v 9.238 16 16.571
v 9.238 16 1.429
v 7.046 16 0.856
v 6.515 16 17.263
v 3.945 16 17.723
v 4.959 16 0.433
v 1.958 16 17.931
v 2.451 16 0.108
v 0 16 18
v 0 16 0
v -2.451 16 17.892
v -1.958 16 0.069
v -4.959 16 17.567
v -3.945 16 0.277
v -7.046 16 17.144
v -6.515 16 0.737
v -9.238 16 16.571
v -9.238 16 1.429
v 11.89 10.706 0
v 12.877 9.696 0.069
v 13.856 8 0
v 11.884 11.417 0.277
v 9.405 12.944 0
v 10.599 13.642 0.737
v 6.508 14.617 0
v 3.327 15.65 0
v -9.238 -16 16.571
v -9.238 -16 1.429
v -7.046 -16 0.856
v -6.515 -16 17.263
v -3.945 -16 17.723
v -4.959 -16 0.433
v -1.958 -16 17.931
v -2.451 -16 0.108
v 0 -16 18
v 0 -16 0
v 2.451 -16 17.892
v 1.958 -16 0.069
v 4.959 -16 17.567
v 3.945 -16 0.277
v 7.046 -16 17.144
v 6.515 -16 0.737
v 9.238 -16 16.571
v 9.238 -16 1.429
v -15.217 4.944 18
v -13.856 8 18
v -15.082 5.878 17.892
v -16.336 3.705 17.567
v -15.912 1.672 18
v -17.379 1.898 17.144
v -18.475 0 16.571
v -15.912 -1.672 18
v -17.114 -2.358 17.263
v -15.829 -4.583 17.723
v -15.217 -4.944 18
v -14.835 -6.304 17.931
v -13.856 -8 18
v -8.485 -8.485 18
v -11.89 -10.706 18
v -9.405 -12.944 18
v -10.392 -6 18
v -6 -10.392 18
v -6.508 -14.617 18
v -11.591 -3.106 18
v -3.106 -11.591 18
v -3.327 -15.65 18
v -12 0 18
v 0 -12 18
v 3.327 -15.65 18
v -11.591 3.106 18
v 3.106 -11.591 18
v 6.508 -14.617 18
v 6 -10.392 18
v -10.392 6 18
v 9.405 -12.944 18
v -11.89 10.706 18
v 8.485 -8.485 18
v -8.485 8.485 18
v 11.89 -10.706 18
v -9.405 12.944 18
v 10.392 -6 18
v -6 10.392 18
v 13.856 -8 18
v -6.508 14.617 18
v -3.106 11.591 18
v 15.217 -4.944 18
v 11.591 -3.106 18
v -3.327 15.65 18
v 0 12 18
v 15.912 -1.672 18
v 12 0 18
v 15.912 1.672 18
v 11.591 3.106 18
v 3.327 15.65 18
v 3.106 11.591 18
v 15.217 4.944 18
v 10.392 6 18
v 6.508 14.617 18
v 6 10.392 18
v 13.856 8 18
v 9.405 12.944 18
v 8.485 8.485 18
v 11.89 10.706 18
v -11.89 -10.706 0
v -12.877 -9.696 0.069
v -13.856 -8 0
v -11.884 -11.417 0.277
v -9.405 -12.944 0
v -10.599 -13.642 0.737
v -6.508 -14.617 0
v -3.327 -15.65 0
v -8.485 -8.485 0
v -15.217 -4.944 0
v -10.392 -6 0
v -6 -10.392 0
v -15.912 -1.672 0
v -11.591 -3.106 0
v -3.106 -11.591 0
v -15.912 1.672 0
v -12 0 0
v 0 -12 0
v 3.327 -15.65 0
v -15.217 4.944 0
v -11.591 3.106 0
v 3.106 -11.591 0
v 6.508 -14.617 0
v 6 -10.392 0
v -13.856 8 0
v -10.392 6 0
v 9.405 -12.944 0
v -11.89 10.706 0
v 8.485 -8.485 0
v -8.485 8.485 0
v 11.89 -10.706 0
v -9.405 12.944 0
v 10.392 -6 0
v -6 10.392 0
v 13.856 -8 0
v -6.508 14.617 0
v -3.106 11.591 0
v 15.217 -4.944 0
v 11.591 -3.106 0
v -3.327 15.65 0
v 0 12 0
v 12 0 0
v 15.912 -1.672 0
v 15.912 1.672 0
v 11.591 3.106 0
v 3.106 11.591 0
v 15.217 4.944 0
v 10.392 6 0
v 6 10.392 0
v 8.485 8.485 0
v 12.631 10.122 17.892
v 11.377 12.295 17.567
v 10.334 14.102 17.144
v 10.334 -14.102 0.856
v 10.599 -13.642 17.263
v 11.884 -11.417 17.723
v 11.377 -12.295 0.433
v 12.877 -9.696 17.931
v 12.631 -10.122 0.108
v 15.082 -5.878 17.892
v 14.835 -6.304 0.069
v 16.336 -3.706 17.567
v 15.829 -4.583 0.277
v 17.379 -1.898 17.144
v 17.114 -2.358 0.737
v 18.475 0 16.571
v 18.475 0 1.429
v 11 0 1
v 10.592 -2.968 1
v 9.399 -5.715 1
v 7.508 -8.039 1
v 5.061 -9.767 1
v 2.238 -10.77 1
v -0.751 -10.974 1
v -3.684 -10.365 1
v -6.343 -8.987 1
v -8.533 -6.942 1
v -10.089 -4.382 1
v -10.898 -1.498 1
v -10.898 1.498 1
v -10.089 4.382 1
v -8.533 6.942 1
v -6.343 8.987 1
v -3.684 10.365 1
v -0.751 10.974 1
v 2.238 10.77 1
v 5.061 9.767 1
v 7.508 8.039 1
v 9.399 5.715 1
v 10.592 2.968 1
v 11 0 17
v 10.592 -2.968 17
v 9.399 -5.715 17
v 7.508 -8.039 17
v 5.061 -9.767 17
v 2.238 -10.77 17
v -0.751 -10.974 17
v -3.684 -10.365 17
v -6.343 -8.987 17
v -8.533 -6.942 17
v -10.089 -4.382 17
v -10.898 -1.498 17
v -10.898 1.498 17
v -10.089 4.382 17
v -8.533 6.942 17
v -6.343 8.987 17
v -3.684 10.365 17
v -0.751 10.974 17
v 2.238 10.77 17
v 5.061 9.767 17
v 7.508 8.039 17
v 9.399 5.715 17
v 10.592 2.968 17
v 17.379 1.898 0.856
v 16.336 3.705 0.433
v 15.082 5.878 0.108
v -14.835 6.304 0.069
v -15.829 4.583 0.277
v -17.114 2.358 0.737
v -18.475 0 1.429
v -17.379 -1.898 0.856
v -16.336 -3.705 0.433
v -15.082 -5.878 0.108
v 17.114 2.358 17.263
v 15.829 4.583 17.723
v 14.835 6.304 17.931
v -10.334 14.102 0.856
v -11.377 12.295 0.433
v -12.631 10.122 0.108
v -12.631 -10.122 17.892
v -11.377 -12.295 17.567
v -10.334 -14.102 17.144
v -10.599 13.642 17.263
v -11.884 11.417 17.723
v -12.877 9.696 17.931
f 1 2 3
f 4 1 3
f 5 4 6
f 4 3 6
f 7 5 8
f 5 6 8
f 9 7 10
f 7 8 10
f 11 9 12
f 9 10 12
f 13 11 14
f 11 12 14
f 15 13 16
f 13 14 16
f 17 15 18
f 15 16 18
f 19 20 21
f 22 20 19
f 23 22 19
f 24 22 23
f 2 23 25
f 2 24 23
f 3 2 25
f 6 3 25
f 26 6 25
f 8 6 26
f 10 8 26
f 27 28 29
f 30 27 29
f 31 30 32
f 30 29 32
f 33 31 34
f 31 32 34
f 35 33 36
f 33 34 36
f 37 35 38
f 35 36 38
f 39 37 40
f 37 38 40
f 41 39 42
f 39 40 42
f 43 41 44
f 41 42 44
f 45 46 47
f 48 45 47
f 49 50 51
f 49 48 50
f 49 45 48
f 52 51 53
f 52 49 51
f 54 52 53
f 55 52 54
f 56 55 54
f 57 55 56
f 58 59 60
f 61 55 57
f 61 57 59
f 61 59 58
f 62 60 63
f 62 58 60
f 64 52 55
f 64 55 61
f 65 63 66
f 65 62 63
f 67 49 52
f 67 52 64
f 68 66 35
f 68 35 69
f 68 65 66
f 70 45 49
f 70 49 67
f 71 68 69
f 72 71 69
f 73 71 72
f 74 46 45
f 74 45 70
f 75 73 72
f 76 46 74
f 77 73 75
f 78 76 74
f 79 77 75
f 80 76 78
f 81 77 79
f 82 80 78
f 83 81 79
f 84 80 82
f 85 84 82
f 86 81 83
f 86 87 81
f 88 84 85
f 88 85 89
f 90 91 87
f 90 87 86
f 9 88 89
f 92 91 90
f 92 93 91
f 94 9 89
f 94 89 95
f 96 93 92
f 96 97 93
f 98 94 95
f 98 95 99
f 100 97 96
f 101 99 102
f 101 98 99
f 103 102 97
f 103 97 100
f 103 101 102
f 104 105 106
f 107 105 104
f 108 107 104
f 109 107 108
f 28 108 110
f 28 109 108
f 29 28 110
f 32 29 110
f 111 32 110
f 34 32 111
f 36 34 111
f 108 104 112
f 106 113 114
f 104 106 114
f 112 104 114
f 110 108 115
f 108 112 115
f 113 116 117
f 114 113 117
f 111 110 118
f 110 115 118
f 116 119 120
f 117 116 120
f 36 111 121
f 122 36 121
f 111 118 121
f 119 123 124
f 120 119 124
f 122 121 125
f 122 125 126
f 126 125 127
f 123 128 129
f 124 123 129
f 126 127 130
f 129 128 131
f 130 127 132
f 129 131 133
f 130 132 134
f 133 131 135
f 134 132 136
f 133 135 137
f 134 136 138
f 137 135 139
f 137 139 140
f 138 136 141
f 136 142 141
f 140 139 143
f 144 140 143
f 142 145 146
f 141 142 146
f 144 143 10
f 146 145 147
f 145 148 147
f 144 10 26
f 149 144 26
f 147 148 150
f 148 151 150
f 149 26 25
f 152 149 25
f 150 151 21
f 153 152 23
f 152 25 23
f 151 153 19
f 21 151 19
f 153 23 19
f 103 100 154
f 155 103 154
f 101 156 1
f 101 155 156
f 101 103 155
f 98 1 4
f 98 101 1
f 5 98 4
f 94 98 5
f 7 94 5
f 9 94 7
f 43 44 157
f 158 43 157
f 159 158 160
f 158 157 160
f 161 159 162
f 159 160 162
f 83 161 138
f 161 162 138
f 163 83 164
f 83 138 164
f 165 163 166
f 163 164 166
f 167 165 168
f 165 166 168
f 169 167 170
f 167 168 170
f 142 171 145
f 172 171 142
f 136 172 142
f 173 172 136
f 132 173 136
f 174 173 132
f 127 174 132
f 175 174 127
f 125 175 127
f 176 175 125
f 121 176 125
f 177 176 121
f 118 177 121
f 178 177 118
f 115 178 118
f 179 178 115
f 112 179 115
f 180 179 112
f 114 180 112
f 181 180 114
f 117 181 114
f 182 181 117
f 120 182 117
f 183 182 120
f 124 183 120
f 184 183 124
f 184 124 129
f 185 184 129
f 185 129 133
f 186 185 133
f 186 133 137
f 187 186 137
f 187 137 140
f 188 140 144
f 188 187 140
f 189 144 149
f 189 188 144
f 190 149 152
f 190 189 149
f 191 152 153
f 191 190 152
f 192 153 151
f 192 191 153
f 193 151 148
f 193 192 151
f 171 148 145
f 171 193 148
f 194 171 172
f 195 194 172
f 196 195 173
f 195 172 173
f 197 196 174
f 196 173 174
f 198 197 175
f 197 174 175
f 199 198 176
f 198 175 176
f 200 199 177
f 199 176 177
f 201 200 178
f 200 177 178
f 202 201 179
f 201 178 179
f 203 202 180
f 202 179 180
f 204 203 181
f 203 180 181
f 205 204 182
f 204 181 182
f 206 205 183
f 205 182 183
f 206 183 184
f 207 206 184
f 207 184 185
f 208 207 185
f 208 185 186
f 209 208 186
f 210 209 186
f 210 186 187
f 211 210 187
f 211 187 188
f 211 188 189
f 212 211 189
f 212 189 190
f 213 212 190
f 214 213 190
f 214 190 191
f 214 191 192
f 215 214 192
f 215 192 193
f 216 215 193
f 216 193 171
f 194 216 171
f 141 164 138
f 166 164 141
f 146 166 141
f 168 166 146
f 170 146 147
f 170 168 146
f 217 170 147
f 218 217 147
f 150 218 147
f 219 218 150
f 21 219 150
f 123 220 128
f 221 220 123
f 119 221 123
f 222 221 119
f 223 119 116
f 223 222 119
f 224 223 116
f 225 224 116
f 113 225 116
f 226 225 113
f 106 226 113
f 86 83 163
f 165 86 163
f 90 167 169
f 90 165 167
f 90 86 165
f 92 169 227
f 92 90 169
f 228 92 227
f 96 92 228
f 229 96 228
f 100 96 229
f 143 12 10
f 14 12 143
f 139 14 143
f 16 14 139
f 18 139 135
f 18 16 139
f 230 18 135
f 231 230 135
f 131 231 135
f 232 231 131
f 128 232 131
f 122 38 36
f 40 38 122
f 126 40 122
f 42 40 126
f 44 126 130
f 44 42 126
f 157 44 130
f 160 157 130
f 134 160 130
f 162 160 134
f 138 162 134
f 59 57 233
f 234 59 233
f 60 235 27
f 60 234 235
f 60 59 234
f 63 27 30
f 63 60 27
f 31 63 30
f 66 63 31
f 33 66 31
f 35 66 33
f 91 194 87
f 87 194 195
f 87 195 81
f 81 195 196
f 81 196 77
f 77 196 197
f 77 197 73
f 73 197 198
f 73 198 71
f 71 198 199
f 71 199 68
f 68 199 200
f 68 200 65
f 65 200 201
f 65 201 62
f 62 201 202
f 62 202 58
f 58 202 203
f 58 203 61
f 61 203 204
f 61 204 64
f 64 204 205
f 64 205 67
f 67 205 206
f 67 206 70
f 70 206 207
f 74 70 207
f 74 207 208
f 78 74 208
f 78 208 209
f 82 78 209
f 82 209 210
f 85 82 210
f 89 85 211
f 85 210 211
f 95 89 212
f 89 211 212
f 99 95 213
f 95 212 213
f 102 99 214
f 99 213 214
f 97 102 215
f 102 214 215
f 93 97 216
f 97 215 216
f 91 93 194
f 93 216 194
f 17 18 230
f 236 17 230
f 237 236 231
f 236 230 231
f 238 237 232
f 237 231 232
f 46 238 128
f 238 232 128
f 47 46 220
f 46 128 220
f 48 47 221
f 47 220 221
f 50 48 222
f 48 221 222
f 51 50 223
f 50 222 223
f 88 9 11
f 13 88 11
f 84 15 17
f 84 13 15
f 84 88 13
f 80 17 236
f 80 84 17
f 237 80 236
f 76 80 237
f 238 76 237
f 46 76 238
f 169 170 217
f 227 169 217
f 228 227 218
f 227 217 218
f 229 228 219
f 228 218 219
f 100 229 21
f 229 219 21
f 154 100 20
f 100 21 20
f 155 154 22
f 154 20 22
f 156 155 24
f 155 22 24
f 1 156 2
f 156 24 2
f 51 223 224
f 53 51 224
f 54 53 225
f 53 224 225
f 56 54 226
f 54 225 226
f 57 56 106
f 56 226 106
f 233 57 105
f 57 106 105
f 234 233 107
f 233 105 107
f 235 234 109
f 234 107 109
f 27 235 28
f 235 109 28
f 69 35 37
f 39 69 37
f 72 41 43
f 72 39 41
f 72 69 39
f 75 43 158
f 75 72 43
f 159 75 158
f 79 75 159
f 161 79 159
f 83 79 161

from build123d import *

# Parameters (mm, degrees)
F1_DEPTH = 18
F4_R     = 11
F5_DEPTH = 18.001
F6_SIZE  = 1


# Not quite as in the source:
# - a feature names something its author has since deleted; it is built from what else it names


with BuildPart() as f1:
    # F0 (on Top) → F1 (new body)
    with BuildSketch(Plane.XY):
        Polygon((18.4752086141, 0), (9.237604307, 16), (-9.237604307, 16), (-18.4752086141, 0), (-9.237604307, -16), (9.237604307, -16), align=None)
    extrude(amount=F1_DEPTH)

    # F2 (on Right) → F3 (revolve, cut)
    with BuildSketch(Plane.YZ):
        Polygon((-29.0477817086, 10.4668597182), (-16, 18), (-29.0477817086, 18), align=None)
        Polygon((-16, 0), (-29.0477817086, 7.5331402818), (-29.0477817086, 0), align=None)
    revolve(axis=Axis((0, 0, 10.077371262), (0, 0, 1)), mode=Mode.SUBTRACT)

    # F4 (on face) → F5 (cut, through all)
    with BuildSketch(Plane(origin=(0, 0, 0), x_dir=(1, 0, 0), z_dir=(0, 0, -1))):
        Circle(F4_R)
    extrude(amount=-F5_DEPTH, mode=Mode.SUBTRACT)

    # F6
    f6_edges = [f1.edges().sort_by_distance(p)[0] for p in [
        (-11, 0, 0),
        (-11, 0, 18),
    ]]
    chamfer(f6_edges, length=F6_SIZE)


solid = f1.part
